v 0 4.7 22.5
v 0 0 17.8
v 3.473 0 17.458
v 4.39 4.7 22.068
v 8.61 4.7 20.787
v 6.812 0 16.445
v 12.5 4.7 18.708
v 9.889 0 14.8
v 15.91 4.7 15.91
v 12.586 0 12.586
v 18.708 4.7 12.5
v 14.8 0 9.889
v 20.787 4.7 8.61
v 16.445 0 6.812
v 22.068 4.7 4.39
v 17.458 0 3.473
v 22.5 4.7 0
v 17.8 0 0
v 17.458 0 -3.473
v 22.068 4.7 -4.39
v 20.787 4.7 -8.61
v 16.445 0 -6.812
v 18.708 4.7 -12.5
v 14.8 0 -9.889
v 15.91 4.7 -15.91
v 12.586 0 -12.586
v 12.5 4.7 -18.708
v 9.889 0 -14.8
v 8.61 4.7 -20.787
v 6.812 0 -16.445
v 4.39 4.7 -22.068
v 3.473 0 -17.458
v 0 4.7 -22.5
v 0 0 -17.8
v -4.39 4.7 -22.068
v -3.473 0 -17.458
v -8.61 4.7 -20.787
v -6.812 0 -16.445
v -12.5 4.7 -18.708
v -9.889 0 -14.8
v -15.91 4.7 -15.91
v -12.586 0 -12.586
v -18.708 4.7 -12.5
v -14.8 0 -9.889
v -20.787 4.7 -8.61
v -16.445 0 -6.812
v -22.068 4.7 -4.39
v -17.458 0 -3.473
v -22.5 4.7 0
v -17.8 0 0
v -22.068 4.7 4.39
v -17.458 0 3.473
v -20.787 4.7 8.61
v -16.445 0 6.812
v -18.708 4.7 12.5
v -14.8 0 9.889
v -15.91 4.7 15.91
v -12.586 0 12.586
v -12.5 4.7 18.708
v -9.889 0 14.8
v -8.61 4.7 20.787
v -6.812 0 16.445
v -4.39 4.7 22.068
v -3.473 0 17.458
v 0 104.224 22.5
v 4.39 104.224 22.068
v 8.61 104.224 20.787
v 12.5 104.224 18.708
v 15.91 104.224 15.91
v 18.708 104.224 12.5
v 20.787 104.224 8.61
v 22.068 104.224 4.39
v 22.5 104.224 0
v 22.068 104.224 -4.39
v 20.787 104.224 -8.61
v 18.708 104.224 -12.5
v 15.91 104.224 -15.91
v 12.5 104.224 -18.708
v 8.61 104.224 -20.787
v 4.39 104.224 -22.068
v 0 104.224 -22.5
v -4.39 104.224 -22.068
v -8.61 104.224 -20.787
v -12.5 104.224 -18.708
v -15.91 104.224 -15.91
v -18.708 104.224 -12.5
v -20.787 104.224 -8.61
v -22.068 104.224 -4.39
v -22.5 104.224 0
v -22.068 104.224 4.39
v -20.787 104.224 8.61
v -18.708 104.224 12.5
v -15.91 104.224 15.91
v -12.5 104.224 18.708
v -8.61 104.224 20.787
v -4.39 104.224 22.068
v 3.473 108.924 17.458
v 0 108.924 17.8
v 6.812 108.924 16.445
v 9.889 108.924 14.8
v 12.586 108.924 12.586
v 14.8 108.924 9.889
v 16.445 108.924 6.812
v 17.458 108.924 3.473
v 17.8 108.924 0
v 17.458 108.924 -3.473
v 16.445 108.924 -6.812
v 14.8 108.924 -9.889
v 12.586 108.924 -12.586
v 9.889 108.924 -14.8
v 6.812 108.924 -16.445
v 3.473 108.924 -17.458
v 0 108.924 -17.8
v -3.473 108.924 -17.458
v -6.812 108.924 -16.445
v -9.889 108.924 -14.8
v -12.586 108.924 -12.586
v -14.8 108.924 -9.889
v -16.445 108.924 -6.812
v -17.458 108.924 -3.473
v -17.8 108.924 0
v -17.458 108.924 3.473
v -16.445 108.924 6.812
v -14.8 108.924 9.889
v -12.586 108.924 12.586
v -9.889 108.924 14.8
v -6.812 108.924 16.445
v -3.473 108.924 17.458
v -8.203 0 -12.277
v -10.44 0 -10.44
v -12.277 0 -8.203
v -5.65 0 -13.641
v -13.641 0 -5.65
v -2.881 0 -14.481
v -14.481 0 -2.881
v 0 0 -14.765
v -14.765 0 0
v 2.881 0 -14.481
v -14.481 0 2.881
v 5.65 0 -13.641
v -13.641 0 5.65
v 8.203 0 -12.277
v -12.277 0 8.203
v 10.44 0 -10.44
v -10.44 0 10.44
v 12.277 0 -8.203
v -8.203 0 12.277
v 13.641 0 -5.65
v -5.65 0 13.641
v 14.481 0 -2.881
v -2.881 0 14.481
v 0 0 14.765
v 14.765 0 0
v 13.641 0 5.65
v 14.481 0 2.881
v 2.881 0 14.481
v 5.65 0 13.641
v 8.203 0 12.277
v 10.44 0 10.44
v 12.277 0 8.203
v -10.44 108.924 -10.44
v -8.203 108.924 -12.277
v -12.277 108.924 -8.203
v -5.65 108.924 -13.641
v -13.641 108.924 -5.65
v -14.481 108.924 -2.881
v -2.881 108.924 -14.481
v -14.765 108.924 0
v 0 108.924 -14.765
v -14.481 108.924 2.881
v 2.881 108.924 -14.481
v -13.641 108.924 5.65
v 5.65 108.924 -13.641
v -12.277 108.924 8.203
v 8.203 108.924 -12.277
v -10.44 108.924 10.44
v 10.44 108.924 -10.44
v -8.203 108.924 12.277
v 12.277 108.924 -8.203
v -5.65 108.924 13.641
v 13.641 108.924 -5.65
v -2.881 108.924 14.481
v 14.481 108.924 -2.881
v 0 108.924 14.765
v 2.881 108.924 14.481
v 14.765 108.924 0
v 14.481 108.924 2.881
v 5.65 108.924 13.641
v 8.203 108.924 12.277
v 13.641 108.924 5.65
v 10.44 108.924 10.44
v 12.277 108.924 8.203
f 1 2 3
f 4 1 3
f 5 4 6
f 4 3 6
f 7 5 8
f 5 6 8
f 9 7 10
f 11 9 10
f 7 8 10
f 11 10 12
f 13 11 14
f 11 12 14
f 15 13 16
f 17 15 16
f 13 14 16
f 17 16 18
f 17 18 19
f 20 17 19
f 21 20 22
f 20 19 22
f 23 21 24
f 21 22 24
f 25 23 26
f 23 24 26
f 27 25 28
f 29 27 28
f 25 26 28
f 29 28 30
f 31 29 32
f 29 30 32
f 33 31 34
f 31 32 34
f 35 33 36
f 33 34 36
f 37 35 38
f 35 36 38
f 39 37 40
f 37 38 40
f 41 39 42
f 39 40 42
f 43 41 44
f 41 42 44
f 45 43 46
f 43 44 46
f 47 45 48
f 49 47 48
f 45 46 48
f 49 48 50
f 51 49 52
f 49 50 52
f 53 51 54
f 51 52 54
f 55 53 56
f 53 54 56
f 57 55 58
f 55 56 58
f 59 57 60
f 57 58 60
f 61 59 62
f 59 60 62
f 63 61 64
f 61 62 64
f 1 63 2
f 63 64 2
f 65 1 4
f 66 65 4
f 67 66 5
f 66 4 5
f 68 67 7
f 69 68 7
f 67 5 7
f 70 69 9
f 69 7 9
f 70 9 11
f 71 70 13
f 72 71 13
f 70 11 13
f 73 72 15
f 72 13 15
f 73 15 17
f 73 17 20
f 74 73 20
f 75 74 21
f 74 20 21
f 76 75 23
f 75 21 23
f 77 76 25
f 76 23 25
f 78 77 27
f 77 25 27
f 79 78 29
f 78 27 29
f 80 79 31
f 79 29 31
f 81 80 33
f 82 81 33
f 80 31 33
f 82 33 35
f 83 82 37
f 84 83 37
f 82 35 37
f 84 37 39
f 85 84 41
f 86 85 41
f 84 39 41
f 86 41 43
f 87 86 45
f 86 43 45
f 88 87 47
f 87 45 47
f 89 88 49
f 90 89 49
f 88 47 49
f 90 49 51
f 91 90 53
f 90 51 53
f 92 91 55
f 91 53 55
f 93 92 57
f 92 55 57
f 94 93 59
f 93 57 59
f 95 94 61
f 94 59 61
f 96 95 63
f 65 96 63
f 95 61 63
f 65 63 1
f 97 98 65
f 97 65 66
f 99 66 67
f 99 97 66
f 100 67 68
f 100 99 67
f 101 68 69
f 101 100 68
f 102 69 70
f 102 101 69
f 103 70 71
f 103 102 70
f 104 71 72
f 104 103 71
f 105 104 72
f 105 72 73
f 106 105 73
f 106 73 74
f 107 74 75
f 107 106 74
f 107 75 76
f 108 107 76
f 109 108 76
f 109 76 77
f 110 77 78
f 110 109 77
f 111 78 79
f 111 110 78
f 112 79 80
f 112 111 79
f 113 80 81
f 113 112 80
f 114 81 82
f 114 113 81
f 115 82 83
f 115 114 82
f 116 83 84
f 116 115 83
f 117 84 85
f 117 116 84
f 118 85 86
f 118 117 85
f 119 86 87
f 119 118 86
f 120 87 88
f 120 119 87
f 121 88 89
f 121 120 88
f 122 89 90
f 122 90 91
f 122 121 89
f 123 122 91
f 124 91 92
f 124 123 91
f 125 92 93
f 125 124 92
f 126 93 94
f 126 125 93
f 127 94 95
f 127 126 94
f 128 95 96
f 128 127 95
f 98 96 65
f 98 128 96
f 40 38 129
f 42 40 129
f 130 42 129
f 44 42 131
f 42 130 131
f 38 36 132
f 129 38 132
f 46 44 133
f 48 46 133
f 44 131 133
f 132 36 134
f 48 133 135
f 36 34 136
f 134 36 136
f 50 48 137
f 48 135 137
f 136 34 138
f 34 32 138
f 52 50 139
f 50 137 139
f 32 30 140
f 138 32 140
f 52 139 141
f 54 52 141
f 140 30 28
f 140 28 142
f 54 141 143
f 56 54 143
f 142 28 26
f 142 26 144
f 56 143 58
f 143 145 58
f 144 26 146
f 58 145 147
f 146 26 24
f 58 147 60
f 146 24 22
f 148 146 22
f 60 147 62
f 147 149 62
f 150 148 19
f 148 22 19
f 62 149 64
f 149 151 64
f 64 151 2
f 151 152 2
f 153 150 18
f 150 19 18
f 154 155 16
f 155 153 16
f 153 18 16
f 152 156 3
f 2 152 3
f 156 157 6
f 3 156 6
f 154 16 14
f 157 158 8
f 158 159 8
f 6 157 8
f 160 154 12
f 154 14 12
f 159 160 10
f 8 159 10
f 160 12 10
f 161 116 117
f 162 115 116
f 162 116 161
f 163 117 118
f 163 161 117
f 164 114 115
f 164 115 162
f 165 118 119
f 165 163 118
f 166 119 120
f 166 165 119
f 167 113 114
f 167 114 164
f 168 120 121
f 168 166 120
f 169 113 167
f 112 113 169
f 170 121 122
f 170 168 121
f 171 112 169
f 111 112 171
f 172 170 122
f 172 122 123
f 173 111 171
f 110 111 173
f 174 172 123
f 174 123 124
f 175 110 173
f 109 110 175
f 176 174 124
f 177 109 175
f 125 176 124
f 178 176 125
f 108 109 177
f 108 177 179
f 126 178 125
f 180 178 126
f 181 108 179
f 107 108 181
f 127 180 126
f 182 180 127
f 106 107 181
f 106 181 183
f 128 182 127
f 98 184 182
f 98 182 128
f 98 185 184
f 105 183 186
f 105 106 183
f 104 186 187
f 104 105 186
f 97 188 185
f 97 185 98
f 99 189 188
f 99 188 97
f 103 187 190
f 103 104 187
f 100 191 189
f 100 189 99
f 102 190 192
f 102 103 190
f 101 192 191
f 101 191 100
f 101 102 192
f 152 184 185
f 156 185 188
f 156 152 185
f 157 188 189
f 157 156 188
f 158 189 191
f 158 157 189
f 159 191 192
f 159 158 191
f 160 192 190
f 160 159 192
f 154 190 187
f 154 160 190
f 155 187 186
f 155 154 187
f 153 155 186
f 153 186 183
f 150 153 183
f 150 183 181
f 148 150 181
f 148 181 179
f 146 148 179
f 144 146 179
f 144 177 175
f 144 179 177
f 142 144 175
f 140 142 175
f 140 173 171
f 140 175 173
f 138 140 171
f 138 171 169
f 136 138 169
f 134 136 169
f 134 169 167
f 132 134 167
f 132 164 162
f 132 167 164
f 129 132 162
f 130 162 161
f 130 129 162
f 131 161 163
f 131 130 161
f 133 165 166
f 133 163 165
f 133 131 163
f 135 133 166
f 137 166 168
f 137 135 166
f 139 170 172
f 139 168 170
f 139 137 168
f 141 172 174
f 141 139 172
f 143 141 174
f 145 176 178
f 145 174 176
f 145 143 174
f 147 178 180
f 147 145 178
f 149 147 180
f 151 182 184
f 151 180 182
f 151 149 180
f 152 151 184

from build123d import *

# Parameters (mm, degrees)
SKETCH1_R           = 22.5
BOSS_EXTRUDE1_DEPTH = 108.923869523
SKETCH2_R           = 14.765011188
CUT_EXTRUDE1_DEPTH  = 114.476470477
CHAMFER1_SIZE       = 4.700245858


with BuildPart() as part:
    # Sketch1 → Boss-Extrude1 (new body)
    with BuildSketch(Plane(origin=(0, 0, 0), x_dir=(1, 0, 0), z_dir=(0, 1, 0))):
        Circle(SKETCH1_R)
    extrude(amount=BOSS_EXTRUDE1_DEPTH)

    # Sketch2 → Cut-Extrude1 (cut, through all)
    with BuildSketch(Plane(origin=(0, 0, 0), x_dir=(1, 0, 0), z_dir=(0, 1, 0))):
        Circle(SKETCH2_R)
    extrude(amount=CUT_EXTRUDE1_DEPTH, mode=Mode.SUBTRACT)

    # Chamfer1
    chamfer1_edges = [part.edges().sort_by_distance(p)[0] for p in [
        (-22.5, 108.923869523, 0),
        (-22.5, 0, 0),
    ]]
    chamfer(chamfer1_edges, length=CHAMFER1_SIZE)


solid = part.part
